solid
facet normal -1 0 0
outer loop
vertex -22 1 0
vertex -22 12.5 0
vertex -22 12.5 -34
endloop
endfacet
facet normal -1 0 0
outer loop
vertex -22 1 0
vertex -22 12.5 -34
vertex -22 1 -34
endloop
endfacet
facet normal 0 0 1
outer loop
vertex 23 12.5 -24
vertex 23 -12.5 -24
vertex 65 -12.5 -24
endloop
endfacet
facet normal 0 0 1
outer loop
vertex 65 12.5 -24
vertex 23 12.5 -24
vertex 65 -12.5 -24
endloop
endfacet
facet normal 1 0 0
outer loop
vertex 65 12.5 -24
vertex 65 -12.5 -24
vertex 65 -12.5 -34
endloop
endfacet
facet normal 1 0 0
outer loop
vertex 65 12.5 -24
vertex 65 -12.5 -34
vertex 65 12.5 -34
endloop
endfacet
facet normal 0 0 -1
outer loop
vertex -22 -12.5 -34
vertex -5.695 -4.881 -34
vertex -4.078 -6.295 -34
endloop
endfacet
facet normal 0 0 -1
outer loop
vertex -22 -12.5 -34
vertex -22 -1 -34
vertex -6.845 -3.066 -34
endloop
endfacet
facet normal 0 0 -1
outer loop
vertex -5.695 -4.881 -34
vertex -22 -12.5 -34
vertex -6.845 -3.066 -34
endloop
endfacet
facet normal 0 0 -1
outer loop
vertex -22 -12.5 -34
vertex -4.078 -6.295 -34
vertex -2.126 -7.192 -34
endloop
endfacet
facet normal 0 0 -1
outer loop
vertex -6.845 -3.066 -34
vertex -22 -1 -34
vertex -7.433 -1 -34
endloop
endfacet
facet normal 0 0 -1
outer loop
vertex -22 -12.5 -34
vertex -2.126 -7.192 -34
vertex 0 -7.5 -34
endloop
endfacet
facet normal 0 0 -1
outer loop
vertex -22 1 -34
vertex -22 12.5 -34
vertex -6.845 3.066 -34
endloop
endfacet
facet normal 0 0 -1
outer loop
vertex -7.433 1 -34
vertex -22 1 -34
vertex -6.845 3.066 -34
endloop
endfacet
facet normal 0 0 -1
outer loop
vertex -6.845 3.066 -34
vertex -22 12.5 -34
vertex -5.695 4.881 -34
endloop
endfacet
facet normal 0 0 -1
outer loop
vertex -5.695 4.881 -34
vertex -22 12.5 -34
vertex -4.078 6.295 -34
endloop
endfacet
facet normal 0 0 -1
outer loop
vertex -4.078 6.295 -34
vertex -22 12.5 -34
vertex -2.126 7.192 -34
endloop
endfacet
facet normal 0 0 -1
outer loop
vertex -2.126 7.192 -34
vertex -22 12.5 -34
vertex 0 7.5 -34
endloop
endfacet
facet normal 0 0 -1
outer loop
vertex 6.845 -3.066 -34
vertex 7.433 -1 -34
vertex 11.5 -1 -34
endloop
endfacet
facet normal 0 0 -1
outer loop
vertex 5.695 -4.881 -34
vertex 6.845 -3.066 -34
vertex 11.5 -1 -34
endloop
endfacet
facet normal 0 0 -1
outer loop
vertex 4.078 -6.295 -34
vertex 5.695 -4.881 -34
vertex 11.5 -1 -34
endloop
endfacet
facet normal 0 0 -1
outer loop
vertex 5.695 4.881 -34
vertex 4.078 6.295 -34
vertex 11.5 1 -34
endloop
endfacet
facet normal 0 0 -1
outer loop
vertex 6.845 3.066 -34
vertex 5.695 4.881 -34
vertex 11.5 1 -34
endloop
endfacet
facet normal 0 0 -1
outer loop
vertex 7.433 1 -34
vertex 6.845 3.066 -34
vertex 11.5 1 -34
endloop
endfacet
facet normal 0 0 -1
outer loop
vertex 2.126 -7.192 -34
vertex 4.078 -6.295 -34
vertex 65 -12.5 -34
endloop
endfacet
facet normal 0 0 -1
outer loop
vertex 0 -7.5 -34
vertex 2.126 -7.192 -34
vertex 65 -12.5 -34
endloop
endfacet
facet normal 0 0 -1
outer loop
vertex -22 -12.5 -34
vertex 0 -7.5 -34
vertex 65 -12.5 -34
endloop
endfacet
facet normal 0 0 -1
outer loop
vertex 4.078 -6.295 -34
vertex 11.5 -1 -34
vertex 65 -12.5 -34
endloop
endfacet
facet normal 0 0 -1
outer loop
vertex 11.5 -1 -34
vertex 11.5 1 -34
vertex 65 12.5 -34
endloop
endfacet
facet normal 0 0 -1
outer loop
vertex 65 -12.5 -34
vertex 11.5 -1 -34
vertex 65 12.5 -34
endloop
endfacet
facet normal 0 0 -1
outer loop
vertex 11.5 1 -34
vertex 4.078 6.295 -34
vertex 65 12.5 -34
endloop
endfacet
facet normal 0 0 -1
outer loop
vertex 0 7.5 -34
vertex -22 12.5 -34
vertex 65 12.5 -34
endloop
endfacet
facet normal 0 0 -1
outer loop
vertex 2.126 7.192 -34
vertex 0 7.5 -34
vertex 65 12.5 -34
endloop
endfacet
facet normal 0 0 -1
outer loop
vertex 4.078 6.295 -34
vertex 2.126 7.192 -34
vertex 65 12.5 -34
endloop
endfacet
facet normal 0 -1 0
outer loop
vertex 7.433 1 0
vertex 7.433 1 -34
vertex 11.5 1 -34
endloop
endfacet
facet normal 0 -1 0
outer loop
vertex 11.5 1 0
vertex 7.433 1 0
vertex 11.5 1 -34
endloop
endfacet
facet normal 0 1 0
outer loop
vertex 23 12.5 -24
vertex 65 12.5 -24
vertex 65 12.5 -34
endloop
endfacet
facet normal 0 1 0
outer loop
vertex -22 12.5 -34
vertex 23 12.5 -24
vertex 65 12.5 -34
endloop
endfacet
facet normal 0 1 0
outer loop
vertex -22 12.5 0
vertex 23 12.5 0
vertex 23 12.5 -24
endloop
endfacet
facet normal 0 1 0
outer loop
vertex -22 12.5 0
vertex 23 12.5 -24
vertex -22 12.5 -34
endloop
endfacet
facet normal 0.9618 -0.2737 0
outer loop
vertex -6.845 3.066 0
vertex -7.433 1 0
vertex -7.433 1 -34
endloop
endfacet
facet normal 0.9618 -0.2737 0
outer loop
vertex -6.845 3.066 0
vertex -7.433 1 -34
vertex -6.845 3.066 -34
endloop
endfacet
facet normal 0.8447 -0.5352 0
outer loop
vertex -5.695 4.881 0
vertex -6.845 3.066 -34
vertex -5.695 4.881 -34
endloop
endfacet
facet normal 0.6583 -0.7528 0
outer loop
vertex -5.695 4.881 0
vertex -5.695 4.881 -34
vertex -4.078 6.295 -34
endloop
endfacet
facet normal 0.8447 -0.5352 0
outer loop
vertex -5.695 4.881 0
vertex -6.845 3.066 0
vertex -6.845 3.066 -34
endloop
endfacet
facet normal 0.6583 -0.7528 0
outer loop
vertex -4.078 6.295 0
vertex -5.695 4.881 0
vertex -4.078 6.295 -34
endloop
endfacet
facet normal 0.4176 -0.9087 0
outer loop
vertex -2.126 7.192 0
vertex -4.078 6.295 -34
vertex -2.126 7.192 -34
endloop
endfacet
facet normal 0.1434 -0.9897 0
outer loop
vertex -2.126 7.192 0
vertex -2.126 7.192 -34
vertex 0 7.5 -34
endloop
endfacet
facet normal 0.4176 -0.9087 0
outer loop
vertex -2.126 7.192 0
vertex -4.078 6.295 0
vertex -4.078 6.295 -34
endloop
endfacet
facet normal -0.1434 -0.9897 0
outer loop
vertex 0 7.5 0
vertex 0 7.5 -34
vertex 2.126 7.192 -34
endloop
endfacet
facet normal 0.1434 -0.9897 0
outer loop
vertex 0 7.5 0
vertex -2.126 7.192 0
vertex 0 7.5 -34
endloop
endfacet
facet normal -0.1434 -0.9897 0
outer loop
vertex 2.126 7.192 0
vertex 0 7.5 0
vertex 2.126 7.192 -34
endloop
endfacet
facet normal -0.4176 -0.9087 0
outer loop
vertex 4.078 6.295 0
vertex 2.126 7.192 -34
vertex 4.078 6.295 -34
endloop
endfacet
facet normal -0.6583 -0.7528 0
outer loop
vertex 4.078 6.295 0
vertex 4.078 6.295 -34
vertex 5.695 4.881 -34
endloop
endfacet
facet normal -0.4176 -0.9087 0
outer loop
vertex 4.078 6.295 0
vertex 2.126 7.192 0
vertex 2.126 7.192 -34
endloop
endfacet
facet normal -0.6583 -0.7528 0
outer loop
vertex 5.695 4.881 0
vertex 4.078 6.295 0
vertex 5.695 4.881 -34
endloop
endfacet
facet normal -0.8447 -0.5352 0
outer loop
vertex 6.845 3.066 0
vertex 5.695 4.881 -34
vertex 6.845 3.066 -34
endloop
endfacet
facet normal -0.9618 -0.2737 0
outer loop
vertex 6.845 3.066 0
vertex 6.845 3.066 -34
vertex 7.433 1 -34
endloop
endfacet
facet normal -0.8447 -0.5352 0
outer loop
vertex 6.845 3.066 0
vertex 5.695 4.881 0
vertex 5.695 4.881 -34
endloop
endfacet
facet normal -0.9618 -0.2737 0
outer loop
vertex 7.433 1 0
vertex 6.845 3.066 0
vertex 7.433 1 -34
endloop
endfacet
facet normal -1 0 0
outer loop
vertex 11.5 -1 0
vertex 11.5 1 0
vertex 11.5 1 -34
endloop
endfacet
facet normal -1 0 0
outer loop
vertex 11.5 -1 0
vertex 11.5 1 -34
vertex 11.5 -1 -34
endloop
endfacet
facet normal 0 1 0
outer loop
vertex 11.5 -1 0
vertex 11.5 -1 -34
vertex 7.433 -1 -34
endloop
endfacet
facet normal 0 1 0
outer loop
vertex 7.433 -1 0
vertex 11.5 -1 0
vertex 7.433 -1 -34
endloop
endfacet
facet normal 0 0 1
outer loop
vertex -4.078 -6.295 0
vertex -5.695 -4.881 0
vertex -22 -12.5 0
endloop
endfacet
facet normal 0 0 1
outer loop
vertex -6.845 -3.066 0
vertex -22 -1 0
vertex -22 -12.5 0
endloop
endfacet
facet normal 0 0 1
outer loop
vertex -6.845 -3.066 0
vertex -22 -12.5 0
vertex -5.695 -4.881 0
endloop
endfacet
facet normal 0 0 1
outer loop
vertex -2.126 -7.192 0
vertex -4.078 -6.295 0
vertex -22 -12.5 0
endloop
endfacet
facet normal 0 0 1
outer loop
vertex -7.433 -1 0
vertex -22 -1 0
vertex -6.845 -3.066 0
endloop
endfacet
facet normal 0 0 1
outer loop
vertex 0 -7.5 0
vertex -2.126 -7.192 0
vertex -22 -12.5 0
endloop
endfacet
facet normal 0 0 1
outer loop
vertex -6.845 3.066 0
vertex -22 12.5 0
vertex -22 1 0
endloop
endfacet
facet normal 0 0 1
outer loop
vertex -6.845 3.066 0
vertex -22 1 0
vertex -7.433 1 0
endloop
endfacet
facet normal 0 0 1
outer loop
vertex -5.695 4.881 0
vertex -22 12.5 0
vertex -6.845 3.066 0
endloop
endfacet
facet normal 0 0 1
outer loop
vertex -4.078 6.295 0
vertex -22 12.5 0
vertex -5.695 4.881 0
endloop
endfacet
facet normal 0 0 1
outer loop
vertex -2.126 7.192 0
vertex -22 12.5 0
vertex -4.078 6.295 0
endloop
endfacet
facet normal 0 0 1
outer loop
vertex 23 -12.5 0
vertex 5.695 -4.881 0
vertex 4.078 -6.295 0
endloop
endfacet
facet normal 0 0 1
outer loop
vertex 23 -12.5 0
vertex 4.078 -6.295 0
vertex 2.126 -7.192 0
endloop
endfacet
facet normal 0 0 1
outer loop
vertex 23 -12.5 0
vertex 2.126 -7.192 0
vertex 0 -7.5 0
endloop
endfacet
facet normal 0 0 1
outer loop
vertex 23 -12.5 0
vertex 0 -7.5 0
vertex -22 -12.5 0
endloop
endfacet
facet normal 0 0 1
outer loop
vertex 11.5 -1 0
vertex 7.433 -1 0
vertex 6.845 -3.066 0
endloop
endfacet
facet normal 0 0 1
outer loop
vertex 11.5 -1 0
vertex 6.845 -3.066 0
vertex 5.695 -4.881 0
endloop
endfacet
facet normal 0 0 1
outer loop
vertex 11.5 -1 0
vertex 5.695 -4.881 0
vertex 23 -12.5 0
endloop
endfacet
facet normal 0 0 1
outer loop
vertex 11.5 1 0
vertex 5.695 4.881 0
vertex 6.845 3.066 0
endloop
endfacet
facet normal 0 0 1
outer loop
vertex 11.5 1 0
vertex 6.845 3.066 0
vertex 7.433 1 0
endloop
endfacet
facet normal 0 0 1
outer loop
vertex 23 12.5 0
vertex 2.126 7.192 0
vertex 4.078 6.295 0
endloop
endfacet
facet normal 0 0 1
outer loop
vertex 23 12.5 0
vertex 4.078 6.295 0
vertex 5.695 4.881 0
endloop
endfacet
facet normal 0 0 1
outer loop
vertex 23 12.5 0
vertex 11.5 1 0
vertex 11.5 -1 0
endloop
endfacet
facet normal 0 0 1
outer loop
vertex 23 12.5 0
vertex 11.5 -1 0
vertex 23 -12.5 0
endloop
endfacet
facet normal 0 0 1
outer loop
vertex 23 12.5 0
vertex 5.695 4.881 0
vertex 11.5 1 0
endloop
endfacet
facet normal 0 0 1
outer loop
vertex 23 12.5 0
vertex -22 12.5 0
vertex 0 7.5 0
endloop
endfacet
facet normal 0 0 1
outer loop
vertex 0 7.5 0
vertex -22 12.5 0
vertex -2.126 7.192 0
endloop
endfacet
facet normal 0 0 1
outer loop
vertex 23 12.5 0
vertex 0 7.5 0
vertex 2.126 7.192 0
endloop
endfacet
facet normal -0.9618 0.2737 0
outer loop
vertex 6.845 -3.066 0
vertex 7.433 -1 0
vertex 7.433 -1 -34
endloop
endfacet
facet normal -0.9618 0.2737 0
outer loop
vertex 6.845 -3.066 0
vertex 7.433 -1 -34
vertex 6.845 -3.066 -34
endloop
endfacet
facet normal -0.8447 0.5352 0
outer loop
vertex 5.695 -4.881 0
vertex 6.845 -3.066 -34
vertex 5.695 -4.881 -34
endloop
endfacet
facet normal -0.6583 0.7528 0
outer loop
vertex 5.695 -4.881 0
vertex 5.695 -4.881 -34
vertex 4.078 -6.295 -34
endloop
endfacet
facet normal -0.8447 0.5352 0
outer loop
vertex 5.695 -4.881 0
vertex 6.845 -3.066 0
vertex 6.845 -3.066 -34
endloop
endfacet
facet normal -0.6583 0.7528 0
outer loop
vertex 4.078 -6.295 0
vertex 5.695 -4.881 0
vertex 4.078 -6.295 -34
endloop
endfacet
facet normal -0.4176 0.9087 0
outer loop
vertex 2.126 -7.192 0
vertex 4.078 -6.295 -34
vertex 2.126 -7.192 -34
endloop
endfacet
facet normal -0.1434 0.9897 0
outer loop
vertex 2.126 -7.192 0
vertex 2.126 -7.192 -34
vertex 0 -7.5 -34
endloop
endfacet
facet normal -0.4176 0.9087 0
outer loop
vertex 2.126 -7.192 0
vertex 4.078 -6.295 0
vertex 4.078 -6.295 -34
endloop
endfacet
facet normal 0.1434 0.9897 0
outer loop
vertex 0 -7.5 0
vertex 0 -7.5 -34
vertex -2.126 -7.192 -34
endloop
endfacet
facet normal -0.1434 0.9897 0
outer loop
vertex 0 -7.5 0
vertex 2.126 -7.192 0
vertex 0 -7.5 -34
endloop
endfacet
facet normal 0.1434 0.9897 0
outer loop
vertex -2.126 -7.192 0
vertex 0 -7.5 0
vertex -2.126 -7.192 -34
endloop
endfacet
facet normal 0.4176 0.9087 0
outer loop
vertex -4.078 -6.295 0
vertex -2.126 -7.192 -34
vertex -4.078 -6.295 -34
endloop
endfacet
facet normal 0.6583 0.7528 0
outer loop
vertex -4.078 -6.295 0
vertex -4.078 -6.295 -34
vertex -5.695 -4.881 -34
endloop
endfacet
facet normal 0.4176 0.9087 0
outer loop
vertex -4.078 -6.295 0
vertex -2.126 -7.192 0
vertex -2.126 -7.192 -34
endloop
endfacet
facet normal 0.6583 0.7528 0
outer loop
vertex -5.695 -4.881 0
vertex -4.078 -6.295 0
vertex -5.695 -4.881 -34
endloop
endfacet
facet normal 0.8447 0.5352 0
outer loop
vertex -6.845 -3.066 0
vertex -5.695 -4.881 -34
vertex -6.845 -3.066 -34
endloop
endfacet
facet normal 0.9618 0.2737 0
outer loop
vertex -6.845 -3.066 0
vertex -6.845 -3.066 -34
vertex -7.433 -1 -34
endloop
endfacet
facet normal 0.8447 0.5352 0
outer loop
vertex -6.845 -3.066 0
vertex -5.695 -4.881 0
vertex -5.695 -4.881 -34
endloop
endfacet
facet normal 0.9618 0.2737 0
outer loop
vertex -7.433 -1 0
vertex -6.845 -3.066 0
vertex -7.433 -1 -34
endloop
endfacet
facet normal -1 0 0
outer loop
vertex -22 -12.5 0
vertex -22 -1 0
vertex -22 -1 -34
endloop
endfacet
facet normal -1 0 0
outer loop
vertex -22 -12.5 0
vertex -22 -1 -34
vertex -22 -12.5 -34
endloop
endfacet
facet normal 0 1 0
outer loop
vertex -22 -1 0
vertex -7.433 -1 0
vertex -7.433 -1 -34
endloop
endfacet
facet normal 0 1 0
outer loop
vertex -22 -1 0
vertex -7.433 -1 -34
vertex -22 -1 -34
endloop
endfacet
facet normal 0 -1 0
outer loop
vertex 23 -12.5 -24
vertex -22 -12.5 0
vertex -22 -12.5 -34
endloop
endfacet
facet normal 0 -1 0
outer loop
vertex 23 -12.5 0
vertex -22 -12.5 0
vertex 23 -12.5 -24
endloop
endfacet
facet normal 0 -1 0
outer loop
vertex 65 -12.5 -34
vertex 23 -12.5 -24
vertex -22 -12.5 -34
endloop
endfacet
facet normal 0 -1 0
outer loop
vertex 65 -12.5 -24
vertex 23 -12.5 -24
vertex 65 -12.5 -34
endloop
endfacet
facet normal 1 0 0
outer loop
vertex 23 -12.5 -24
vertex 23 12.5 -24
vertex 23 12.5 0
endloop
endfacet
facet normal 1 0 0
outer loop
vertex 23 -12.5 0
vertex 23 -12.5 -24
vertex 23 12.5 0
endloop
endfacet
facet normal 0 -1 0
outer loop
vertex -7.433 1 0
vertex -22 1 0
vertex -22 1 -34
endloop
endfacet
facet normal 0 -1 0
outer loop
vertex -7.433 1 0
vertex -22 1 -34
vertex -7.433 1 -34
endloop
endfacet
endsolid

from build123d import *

# Parameters (mm, degrees)
LINEAR_AUSTRAGEN1_DEPTH         = 34
SCHNITT_LINEAR_AUSTRAGEN1_REACH = 79.498
SKIZZE8_W                       = 42
SKIZZE8_H                       = 24


with BuildPart() as part:
    # Skizze1 → Linear austragen1 (new body)
    with BuildSketch(Plane.XY):
        with BuildLine():
            Line((-22, -1), (-22, -12.5))
            Line((-22, -12.5), (65, -12.5))
            Line((65, -12.5), (65, 12.5))
            Line((65, 12.5), (-22, 12.5))
            Line((-22, 12.5), (-22, 1))
            Line((-22, 1), (-7.433034374, 1))
            ThreePointArc((-7.433034374, 1), (0, 7.5), (7.433034374, 1))
            Line((7.433034374, 1), (11.5, 1))
            Line((11.5, 1), (11.5, -1))
            Line((11.5, -1), (7.433034374, -1))
            ThreePointArc((7.433034374, -1), (0, -7.5), (-7.433034374, -1))
            Line((-7.433034374, -1), (-22, -1))
        make_face()
    extrude(amount=-LINEAR_AUSTRAGEN1_DEPTH)

    # Skizze8 → Schnitt-Linear austragen1 (cut, up to next)
    with BuildSketch(Plane.XZ.offset(12.5), mode=Mode.PRIVATE) as schnitt_linear_austragen1_sk1:
        with Locations((44, -12)):
            Rectangle(SKIZZE8_W, SKIZZE8_H)
    schnitt_linear_austragen1_tool1 = extrude(schnitt_linear_austragen1_sk1.sketch, amount=-SCHNITT_LINEAR_AUSTRAGEN1_REACH, mode=Mode.PRIVATE) & part.part
    add(schnitt_linear_austragen1_tool1.solids().sort_by_distance((44, -12.5, -12))[0], mode=Mode.SUBTRACT)


solid = part.part
